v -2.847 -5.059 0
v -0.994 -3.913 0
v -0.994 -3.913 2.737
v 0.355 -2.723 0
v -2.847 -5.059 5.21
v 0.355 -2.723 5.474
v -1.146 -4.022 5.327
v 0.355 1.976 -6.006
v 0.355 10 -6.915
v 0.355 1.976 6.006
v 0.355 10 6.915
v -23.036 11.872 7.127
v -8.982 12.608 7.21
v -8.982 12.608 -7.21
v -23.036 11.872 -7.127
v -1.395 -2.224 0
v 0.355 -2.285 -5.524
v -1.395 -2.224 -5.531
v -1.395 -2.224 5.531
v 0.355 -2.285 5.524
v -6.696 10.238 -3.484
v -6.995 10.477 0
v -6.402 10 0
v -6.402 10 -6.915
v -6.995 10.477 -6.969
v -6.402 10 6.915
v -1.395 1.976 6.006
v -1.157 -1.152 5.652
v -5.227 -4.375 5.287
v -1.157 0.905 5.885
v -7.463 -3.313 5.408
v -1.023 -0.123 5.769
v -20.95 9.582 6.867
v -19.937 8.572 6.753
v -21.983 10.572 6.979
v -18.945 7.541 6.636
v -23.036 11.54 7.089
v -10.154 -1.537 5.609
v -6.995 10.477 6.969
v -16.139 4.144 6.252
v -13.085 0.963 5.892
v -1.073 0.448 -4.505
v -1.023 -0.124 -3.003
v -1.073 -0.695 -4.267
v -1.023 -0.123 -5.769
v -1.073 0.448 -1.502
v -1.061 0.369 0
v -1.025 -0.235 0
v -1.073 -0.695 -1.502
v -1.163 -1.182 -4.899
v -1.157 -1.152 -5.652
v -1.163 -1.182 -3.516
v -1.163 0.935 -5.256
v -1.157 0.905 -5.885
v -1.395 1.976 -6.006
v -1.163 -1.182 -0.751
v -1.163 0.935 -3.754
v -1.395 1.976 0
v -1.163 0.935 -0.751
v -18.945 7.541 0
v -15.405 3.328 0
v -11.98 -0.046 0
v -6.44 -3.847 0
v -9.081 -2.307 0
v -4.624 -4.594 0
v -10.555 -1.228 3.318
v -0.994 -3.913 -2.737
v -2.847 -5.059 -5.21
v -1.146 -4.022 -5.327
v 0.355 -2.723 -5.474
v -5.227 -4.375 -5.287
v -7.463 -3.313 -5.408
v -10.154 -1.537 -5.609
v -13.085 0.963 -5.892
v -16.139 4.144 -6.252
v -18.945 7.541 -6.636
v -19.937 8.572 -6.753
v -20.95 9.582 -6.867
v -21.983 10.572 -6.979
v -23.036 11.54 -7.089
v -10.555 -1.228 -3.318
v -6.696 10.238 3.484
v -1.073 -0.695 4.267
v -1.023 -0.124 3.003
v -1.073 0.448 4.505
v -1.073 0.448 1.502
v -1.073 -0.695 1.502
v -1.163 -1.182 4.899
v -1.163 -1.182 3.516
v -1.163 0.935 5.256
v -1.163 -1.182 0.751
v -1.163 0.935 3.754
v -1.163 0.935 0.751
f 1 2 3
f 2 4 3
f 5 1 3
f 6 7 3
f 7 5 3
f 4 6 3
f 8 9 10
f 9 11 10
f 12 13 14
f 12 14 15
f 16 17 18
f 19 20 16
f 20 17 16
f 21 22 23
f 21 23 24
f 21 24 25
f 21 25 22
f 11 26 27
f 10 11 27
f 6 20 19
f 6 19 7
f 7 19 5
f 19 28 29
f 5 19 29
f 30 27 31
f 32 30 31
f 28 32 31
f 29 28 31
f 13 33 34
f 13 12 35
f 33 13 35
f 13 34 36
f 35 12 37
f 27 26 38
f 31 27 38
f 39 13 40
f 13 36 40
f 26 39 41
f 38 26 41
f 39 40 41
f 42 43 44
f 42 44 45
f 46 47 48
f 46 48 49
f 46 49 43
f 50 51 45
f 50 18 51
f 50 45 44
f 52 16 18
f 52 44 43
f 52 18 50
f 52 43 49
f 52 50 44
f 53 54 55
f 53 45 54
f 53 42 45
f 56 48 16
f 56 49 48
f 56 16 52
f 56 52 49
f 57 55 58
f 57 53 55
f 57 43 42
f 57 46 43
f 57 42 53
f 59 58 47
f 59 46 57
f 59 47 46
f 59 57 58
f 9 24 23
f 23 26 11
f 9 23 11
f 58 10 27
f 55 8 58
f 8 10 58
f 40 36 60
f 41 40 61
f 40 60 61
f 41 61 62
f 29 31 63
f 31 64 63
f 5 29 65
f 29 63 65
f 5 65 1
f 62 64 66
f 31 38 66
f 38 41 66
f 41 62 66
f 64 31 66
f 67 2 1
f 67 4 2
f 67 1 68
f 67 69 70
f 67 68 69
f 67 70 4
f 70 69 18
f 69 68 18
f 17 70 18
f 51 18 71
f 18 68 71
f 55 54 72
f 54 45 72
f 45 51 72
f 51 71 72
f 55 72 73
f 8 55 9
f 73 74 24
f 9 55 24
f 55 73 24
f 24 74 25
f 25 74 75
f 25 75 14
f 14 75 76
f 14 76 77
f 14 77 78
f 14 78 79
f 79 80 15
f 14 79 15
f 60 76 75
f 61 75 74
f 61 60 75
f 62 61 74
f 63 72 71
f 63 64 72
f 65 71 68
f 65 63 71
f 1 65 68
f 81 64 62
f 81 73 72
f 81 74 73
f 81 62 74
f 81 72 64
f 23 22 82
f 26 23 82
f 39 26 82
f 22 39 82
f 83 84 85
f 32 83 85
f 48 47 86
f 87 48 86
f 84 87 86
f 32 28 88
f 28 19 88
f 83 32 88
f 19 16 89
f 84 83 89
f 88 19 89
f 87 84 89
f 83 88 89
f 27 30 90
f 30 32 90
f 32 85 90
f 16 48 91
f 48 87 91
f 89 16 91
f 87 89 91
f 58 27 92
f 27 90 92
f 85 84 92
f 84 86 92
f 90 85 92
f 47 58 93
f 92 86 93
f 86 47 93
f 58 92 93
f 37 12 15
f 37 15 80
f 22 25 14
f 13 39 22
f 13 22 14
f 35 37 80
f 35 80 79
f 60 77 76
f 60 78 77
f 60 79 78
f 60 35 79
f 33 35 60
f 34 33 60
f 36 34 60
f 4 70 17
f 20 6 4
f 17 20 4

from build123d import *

# Parameters (mm, degrees)
SALIENTE_EXTRUIR1_DEPTH             = 7.21
SALIENTE_EXTRUIR2_DEPTH             = 7.21
SALIENTE_EXTRUIR2_DEPTH_BACK        = 7.21
CORTAR_EXTRUIR2_DEPTH               = 28.232395202
CORTAR_EXTRUIR2_DEPTH_BACK          = 28.232395202
SALIENTE_EXTRUIR3_REACH             = 29.232
SALIENTE_EXTRUIR3_DIRECTION_2_REACH = 29.232


with BuildPart() as part:
    # Croquis1 → Saliente-Extruir1 (new, symmetric)
    with BuildSketch(Plane.XY):
        with BuildLine():
            add(Edge.make_bspline(
                [(-18.945192114, 7.540918896), (-10.215008384, -3.697644103), (-2.846604825, -5.059081104)],
                knots=[0.497667241, 0.497667241, 0.497667241, 0.49955428, 0.49955428, 0.49955428], degree=2, weights=[1, 1, 1]))
            add(Edge.make_bspline(
                [(-2.846604825, -5.059081104), (-0.742366882, -3.9352066), (0.355125, -2.723253227)],
                knots=[0.498812075, 0.498812075, 0.498812075, 0.499412845, 0.499412845, 0.499412845], degree=2, weights=[1, 1, 1]))
            Line((0.355125, -2.723253227), (0.355125, -2.284841781))
            Line((0.355125, -2.284841781), (-1.394875, -2.223730435))
            add(Edge.make_bspline(
                [(-1.394875, -2.223730435), (-0.90753067, -0.123730435), (-1.394875, 1.976269565)],
                knots=[0, 0, 0, 1, 1, 1], degree=2, weights=[1, 3.231801219, 1]))
            Line((-1.394875, 1.976269565), (0.355125, 2.284841781))
            Line((0.355125, 2.284841781), (0.355125, 3.001549529))
            add(Edge.make_bspline(
                [(0.355125, 3.001549529), (-1.44872627, 6.058427314), (-6.994875026, 10.477389992)],
                knots=[0.500820705, 0.500820705, 0.500820705, 0.502013312, 0.502013312, 0.502013312], degree=2, weights=[1, 1, 1]))
            Line((-6.994875026, 10.477389992), (-8.981845695, 12.608155172))
            Line((-8.981845695, 12.608155172), (-23.035921146, 11.871612288))
            Line((-23.035921146, 11.871612288), (-23.035921146, 11.54013782))
            ThreePointArc((-23.035921146, 11.54013782), (-20.949684518, 9.582335705), (-18.945192114, 7.540918896))
        make_face()
    extrude(amount=SALIENTE_EXTRUIR1_DEPTH, both=True)

    # Croquis4 → Saliente-Extruir2 (add, two sides: drawn at the far end of the back side and taken through both)
    with BuildSketch(Plane.XY.offset(-SALIENTE_EXTRUIR2_DEPTH_BACK)):
        Polygon((-1.394875, 1.976269565), (0.355125, 2.284841781), (0.355125, 1.976269565), align=None)
    extrude(amount=SALIENTE_EXTRUIR2_DEPTH + SALIENTE_EXTRUIR2_DEPTH_BACK)

    # Croquis6 → Cortar-Extruir2 (cut, two sides: drawn at the far end of the back side and taken through both)
    with BuildSketch(Plane(origin=(0, 0, 0), x_dir=(0, 0, -1), z_dir=(1, 0, 0)).offset(-CORTAR_EXTRUIR2_DEPTH_BACK)):
        Polygon((7.21, 12.608155172), (7.21, -5.059081104), (5.21, -5.059081104), align=None)
        Polygon((-7.21, 12.608155172), (-7.21, -5.059081104), (-5.21, -5.059081104), align=None)
    extrude(amount=CORTAR_EXTRUIR2_DEPTH + CORTAR_EXTRUIR2_DEPTH_BACK, mode=Mode.SUBTRACT)

    # Saliente-Extruir3: up to this plane
    saliente_extruir3_end = Plane(origin=(-23.035921146, 12.608155172, 7.21), z_dir=(0, 0.1124854344122626, -0.9936533736897816))
    # Croquis8 → Saliente-Extruir3 (add, up to the surface)
    with BuildSketch(Plane.XY, mode=Mode.PRIVATE) as saliente_extruir3_sk1:
        with BuildLine():
            Line((-6.40174466, 10), (0.355125, 10))
            Line((0.355125, 10), (0.355125, 3.001549529))
            add(Edge.make_bspline(
                [(-6.40174466, 10), (-1.350464373, 5.891908813), (0.355125, 3.001549529)],
                knots=[0.50088567, 0.50088567, 0.50088567, 0.502013312, 0.502013312, 0.502013312], degree=2, weights=[1, 1, 1]))
        make_face()
    saliente_extruir3_tool1 = split(extrude(saliente_extruir3_sk1.sketch, amount=SALIENTE_EXTRUIR3_REACH, mode=Mode.PRIVATE), bisect_by=saliente_extruir3_end, keep=Keep.BOTH, mode=Mode.PRIVATE)
    add(saliente_extruir3_tool1.solids().sort_by_distance((-1.802267, 7.821617, 0))[0])

    # Saliente-Extruir3 direction 2: up to this plane
    saliente_extruir3_direction_2_end = Plane(origin=(-23.035921146, 12.608155172, -7.21), z_dir=(0, 0.1124854344122626, 0.9936533736897816))
    # Croquis8 → Saliente-Extruir3 direction 2 (add, up to the surface)
    with BuildSketch(Plane.XY, mode=Mode.PRIVATE) as saliente_extruir3_direction_2_sk1:
        with BuildLine():
            Line((-6.40174466, 10), (0.355125, 10))
            Line((0.355125, 10), (0.355125, 3.001549529))
            add(Edge.make_bspline(
                [(-6.40174466, 10), (-1.350464373, 5.891908813), (0.355125, 3.001549529)],
                knots=[0.50088567, 0.50088567, 0.50088567, 0.502013312, 0.502013312, 0.502013312], degree=2, weights=[1, 1, 1]))
        make_face()
    saliente_extruir3_direction_2_tool1 = split(extrude(saliente_extruir3_direction_2_sk1.sketch, amount=-SALIENTE_EXTRUIR3_DIRECTION_2_REACH, mode=Mode.PRIVATE), bisect_by=saliente_extruir3_direction_2_end, keep=Keep.BOTH, mode=Mode.PRIVATE)
    add(saliente_extruir3_direction_2_tool1.solids().sort_by_distance((-1.802267, 7.821617, 0))[0])


solid = part.part
